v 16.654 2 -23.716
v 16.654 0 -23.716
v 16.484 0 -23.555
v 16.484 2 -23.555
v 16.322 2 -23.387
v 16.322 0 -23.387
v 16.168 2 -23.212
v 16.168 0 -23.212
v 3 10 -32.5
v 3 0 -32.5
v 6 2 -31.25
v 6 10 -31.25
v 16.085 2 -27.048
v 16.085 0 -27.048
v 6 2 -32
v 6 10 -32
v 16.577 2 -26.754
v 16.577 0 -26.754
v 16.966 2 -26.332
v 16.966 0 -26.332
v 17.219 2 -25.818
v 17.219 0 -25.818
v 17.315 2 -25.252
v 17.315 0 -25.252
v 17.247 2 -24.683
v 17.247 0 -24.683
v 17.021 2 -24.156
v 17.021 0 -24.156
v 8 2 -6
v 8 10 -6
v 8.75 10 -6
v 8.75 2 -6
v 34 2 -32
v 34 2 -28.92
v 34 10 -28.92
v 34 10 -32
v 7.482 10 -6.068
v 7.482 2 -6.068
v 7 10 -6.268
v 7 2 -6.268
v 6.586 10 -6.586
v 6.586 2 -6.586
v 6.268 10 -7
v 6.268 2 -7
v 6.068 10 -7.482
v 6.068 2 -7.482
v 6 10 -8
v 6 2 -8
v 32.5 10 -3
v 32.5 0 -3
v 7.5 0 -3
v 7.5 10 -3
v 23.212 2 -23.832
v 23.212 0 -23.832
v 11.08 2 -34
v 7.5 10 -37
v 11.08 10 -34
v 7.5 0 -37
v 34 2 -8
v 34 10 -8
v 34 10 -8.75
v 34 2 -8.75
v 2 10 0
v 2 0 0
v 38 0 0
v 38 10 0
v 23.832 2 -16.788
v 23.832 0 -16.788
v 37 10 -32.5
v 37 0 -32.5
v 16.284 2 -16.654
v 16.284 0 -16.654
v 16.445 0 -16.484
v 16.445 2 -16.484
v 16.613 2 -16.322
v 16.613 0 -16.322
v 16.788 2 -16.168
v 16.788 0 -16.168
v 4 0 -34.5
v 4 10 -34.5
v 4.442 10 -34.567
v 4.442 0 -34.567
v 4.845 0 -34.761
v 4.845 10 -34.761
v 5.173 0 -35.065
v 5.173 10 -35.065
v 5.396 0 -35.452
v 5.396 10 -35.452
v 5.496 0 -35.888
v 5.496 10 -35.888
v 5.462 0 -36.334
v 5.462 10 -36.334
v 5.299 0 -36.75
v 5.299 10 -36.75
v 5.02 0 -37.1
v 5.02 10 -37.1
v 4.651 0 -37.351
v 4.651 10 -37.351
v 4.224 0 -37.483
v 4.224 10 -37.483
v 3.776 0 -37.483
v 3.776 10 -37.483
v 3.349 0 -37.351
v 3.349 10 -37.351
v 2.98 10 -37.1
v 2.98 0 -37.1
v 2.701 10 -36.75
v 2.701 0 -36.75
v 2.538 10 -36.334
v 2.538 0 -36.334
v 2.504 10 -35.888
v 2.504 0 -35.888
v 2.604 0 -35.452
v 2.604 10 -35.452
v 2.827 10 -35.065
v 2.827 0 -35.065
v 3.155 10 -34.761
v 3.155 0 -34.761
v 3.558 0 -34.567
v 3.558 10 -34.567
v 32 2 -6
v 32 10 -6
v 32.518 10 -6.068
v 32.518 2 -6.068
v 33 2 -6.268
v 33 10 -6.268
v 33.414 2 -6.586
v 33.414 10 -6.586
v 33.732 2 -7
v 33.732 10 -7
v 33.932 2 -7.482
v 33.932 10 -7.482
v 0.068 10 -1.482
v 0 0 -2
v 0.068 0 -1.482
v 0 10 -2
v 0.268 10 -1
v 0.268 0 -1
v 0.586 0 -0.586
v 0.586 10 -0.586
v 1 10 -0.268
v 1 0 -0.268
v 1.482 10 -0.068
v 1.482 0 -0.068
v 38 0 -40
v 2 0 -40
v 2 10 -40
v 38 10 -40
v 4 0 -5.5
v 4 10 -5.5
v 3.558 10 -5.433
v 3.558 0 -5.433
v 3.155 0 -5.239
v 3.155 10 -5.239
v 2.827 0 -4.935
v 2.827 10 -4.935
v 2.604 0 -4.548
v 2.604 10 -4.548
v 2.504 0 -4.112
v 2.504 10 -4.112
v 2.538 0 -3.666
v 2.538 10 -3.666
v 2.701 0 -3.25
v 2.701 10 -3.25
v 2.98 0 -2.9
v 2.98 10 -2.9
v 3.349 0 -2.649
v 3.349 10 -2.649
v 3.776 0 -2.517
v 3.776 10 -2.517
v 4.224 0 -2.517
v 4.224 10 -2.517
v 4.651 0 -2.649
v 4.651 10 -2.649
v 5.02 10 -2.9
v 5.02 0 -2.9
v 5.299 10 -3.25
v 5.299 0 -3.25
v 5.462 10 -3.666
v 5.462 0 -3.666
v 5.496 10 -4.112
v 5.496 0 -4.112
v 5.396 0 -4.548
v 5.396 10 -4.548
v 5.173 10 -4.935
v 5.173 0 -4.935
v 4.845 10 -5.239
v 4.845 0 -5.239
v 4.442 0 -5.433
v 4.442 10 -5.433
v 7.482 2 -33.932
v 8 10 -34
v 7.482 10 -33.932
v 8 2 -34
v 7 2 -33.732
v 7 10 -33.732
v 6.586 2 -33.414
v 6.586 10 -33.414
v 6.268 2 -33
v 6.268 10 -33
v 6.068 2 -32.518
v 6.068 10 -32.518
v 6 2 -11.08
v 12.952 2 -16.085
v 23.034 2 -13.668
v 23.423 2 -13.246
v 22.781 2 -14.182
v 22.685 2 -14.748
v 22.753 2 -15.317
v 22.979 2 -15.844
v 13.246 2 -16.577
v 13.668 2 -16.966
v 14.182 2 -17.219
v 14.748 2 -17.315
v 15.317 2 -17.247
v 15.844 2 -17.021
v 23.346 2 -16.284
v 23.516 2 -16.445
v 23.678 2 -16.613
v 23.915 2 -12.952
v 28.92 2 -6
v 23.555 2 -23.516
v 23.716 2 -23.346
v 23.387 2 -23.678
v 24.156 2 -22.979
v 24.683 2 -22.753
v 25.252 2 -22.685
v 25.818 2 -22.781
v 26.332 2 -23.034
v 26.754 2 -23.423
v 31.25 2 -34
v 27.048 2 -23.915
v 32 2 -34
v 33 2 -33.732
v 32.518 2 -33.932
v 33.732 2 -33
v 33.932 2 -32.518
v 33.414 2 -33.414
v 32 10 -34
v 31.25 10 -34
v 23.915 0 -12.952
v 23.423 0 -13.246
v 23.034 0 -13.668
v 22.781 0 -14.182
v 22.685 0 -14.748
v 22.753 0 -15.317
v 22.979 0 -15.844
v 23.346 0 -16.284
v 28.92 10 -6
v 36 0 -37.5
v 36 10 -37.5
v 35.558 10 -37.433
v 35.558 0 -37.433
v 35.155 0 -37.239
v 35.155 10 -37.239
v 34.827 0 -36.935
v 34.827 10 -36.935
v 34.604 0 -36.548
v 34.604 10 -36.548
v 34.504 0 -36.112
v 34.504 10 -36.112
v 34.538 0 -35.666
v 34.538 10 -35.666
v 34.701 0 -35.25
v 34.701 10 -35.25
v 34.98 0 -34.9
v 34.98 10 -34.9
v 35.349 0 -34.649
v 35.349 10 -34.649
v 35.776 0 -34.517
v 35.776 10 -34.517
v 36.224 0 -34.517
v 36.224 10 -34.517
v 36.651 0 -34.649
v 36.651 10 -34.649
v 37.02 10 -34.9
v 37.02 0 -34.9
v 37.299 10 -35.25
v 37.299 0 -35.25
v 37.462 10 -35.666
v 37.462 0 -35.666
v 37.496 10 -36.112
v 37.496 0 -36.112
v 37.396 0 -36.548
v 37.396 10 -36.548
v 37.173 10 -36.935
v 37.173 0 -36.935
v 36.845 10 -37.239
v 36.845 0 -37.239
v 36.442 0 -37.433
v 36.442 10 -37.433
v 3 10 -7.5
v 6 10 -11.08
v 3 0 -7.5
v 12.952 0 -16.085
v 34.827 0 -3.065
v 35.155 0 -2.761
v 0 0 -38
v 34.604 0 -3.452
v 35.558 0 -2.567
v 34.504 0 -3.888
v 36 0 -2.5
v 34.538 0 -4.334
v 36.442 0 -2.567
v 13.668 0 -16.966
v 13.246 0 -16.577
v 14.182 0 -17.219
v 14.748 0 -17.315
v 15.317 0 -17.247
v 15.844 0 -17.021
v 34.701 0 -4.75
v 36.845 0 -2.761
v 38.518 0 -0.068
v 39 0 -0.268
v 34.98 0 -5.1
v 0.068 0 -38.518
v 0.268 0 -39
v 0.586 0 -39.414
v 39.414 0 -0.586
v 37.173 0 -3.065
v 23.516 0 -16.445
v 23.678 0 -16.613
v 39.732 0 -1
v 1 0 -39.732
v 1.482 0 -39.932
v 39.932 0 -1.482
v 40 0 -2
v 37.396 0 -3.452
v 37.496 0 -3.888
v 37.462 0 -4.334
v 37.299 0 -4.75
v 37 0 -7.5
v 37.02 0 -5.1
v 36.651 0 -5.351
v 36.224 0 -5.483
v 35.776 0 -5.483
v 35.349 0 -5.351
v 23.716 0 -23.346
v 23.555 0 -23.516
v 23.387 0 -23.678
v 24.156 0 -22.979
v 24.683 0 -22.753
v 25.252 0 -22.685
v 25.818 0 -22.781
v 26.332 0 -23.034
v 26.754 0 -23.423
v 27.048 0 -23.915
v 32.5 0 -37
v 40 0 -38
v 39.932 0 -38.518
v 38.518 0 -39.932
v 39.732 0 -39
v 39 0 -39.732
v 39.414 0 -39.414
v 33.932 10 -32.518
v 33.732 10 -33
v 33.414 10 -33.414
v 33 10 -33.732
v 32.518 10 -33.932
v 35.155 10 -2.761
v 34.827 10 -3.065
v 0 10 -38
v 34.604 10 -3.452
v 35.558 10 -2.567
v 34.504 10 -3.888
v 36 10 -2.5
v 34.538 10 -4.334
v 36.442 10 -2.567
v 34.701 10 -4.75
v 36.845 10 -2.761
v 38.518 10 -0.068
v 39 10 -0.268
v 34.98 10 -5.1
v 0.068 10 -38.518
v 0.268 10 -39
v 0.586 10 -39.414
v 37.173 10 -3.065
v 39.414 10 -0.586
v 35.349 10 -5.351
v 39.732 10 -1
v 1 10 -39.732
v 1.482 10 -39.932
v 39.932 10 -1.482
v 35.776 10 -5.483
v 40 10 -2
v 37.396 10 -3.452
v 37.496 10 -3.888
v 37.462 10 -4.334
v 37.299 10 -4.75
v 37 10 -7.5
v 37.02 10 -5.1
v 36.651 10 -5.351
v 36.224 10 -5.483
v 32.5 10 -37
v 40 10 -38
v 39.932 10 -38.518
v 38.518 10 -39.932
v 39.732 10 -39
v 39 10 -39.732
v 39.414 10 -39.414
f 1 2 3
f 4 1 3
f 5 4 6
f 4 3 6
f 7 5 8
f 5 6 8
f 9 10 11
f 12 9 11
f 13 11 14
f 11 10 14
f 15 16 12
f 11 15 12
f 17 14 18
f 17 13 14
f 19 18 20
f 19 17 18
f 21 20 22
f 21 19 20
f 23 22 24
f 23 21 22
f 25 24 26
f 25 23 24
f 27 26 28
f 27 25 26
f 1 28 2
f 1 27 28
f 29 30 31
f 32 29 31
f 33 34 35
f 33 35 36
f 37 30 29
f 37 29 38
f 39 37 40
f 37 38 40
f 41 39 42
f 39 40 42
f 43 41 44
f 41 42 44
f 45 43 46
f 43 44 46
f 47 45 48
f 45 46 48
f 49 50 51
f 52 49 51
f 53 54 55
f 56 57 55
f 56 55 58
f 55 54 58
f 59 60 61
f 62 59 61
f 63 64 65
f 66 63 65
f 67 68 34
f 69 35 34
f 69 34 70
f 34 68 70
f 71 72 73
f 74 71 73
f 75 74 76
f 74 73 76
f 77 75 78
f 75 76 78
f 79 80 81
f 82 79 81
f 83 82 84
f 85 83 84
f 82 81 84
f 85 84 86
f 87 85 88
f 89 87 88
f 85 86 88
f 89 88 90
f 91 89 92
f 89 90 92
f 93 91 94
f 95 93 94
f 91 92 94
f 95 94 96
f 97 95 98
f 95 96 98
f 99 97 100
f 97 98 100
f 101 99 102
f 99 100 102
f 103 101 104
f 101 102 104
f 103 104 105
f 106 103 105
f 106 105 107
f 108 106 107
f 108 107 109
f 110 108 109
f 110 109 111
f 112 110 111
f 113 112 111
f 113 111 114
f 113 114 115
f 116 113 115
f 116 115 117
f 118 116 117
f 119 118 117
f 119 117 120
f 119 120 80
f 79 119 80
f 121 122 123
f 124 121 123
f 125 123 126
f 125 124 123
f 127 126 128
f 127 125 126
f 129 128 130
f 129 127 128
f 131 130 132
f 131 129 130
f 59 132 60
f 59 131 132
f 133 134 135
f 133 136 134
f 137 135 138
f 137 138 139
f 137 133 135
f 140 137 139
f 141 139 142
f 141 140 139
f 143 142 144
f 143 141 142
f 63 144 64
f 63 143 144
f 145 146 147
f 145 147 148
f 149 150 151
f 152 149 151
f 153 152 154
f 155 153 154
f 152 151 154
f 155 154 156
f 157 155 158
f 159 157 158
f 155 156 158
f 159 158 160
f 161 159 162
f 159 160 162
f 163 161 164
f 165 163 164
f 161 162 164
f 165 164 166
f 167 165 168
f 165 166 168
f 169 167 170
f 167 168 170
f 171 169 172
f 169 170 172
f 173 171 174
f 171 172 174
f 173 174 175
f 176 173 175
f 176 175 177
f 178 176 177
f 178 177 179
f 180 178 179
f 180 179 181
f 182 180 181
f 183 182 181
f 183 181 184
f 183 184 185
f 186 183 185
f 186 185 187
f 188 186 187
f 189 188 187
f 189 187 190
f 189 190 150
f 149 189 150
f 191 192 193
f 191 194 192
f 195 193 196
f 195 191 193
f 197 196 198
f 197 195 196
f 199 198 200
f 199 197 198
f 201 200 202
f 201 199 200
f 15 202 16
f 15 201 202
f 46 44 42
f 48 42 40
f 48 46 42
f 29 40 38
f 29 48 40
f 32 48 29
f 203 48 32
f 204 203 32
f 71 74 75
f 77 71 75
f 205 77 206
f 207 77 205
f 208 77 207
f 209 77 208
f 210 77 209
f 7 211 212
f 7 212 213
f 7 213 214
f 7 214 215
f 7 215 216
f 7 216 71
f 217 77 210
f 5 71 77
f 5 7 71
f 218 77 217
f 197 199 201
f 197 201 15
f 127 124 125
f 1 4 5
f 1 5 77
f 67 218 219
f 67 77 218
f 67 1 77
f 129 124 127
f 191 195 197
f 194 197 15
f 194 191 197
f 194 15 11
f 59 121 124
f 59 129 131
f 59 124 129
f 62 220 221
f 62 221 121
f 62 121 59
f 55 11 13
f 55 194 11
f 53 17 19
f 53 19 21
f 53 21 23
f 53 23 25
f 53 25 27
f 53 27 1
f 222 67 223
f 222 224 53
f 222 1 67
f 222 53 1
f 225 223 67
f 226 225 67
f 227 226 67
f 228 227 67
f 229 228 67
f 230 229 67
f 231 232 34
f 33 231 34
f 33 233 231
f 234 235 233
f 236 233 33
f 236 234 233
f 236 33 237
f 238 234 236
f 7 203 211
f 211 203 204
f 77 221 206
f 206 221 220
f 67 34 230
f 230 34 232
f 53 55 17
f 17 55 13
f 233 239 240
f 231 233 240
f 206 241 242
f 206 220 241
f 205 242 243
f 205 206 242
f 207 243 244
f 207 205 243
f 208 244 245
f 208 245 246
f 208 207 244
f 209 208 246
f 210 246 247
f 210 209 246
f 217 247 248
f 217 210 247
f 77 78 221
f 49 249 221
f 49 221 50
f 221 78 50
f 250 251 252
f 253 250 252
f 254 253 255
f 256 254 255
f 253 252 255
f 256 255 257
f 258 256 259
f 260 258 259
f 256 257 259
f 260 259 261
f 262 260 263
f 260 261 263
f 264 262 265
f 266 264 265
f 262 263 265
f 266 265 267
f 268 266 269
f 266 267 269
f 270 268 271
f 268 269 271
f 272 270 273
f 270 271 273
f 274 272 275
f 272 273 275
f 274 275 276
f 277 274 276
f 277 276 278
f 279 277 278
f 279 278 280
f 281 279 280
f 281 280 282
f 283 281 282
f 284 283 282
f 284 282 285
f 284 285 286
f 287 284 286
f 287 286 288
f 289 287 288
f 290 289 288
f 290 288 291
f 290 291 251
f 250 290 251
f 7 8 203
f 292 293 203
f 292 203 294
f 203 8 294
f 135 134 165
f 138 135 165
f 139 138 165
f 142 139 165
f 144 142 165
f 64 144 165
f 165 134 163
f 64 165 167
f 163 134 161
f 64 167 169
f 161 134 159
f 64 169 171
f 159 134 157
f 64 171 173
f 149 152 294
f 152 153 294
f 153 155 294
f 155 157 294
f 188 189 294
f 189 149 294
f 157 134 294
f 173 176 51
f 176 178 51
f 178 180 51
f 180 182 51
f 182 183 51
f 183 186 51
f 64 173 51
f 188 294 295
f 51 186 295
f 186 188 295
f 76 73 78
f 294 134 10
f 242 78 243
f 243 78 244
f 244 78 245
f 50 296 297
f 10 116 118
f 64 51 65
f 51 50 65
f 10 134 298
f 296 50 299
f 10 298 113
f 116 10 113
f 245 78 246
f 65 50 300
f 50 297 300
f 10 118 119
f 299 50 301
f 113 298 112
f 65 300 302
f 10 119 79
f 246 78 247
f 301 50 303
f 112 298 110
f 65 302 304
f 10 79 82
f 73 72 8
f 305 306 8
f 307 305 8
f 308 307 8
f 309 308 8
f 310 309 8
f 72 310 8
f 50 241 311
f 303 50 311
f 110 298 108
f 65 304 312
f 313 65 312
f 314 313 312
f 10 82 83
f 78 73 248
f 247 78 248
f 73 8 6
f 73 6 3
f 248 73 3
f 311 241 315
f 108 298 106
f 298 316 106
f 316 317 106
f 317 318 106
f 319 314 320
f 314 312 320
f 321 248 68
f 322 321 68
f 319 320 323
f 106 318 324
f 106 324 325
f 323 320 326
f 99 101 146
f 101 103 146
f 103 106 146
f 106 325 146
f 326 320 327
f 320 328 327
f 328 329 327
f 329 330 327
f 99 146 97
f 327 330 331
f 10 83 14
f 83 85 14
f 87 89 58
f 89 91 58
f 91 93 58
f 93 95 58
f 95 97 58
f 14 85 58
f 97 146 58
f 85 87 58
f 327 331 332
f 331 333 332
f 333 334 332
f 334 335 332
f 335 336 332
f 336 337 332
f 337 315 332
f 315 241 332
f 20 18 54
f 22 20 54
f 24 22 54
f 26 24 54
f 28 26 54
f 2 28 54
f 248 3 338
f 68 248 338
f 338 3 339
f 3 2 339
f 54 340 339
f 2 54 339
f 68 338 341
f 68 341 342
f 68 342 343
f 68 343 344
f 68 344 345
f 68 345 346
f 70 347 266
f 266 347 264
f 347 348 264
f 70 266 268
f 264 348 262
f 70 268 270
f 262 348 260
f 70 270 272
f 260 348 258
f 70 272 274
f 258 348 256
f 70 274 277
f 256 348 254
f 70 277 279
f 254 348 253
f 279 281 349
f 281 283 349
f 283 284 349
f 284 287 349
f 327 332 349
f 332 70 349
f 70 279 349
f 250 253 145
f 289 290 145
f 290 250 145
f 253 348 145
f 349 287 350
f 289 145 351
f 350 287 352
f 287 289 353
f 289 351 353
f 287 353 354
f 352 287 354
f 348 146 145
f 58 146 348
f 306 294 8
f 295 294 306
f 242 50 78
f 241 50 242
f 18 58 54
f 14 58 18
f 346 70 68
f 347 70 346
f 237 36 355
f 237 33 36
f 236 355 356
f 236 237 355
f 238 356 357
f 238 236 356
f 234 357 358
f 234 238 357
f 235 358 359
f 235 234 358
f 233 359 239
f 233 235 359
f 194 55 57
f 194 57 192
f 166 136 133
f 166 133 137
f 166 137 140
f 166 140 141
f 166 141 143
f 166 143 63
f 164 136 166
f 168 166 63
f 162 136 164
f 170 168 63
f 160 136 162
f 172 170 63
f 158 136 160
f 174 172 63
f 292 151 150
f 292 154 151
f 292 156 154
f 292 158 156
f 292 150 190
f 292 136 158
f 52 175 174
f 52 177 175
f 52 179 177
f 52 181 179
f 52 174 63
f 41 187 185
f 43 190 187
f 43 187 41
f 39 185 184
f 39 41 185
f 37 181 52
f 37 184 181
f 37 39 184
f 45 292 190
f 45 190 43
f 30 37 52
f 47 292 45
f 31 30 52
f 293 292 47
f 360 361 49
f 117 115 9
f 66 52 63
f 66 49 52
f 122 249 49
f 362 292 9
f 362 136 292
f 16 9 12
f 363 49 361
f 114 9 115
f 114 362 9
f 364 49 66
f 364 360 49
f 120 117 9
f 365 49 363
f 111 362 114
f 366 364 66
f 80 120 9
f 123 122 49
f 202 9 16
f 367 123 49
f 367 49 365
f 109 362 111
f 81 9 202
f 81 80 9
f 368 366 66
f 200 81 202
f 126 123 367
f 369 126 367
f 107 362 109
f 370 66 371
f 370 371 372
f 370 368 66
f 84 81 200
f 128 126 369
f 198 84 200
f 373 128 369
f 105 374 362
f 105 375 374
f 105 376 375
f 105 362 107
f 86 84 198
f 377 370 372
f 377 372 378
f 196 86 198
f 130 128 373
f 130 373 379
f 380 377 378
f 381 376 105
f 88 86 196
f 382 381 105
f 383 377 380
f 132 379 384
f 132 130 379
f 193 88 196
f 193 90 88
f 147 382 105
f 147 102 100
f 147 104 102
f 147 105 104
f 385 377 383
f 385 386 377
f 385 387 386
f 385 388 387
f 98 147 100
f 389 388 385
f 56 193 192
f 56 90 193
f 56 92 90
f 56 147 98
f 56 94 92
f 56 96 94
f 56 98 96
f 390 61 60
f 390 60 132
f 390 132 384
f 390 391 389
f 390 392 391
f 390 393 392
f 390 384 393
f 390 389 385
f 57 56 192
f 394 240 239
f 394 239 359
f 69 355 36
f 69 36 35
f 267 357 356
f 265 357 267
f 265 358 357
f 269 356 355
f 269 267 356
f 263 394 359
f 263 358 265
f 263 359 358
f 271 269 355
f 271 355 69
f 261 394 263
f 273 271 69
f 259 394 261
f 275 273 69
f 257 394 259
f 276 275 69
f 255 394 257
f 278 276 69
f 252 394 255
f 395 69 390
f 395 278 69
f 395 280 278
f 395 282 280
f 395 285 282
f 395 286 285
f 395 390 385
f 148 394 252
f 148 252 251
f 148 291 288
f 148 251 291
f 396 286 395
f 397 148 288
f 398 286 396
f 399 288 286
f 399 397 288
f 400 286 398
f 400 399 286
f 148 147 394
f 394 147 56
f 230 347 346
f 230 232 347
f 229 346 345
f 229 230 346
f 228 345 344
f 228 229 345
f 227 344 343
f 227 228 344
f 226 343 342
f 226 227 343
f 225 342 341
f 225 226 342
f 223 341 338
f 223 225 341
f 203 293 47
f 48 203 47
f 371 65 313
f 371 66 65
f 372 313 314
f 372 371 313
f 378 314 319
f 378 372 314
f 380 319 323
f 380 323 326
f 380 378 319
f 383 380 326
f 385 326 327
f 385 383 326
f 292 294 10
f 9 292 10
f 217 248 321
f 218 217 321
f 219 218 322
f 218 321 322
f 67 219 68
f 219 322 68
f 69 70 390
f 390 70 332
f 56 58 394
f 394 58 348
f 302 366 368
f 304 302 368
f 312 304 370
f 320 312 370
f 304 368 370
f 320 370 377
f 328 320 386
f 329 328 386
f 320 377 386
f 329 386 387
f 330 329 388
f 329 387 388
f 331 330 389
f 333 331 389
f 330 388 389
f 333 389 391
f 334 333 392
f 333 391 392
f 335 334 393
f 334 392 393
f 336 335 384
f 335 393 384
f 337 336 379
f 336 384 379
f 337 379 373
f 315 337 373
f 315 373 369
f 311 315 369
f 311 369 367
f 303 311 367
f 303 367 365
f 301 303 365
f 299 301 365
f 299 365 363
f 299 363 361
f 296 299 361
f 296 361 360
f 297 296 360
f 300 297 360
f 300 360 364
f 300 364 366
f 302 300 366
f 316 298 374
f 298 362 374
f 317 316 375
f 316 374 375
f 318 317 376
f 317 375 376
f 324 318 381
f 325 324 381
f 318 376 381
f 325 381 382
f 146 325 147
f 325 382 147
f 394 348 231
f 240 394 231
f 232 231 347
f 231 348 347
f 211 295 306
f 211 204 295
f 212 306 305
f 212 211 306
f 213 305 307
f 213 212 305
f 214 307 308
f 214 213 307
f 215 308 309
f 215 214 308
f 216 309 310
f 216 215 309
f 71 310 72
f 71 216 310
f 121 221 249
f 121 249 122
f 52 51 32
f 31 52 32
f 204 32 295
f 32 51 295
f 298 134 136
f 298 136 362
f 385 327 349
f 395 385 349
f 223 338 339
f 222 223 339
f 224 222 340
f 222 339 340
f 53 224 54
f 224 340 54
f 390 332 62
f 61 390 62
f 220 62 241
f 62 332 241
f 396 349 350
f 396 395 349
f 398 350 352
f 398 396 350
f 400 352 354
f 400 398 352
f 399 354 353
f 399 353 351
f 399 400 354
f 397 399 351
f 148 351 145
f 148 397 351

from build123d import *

# Parameters (mm, degrees)
SKETCH_1_W          = 40
SKETCH_1_H          = 40
EXTRUDE_1_DEPTH     = 10
FILLET_1_R          = 2
CUT_EXTRUDE_1_DEPTH = 8
FILLET_2_R          = 2
SKETCH_3_R          = 1.5
SKETCH_3_R_2        = 1.4999999999999978
SKETCH_3_R_3        = 1.500000000000004
SKETCH_3_R_4        = 1.5000000000000042
CUT_EXTRUDE_2_DEPTH = 58.445626465380286
CUT_EXTRUDE_3_DEPTH = 58.445626465380286
FILLET_3_R          = 2


with BuildPart() as part:
    # 草图1 → 凸台-拉伸1 (new body)
    with BuildSketch(Plane(origin=(0, 0, 0), x_dir=(1, 0, 0), z_dir=(0, 1, 0))):
        with Locations((20, 20)):
            Rectangle(SKETCH_1_W, SKETCH_1_H)
    extrude(amount=EXTRUDE_1_DEPTH)

    # 圆角1
    fillet_1_edges = [part.edges().sort_by_distance(p)[0] for p in [
        (0, 5, -40),
        (40, 5, -40),
        (40, 5, 0),
        (0, 5, 0),
    ]]
    fillet(fillet_1_edges, radius=FILLET_1_R)

    # 草图2 → 切除-拉伸1 (cut)
    with BuildSketch(Plane(origin=(0, 10, 0), x_dir=(1, 0, 0), z_dir=(0, 1, 0))):
        Polygon((6, 5.999999999999999), (34, 6), (34, 34), (5.999999999999999, 34), align=None)
    extrude(amount=-CUT_EXTRUDE_1_DEPTH, mode=Mode.SUBTRACT)

    # 圆角2
    fillet_2_edges = [part.edges().sort_by_distance(p)[0] for p in [
        (6, 6, -5.999999999999999),
        (5.999999999999999, 6, -34),
        (34, 6, -34),
        (34, 6, -6),
    ]]
    fillet(fillet_2_edges, radius=FILLET_2_R)

    # 草图3 → 切除-拉伸2 (cut, through all)
    with BuildSketch(Plane(origin=(0, 10, 0), x_dir=(1, 0, 0), z_dir=(0, 1, 0))):
        with Locations(Location((4.0000000000000036, 36.00000000000001, 0), (0, 0, 270))):
            Circle(SKETCH_3_R)
        with Locations(Location((4.0000000000000036, 4, 0), (0, 0, 90))):
            Circle(SKETCH_3_R_2)
        with Locations(Location((36.00000000000001, 4.000000000000004, 0), (0, 0, 270))):
            Circle(SKETCH_3_R_3)
        with Locations(Location((36.00000000000001, 36.00000000000002, 0), (0, 0, 90))):
            Circle(SKETCH_3_R_4)
    extrude(amount=-CUT_EXTRUDE_2_DEPTH, mode=Mode.SUBTRACT)

    # 草图4 → 切除-拉伸3 (cut, through all)
    with BuildSketch(Plane.XZ):
        with BuildLine():
            ThreePointArc((21.923076923076923, -24.615384615384617), (18.815219099044967, -24.857601693915647), (16.167883211678838, -23.211678832116792))
            Line((16.167883211678838, -23.211678832116792), (2.9999999999999947, -7.5))
            Line((2.999999999999995, -7.5), (2.999999999999995, -32.5))
            Line((2.9999999999999964, -32.5), (21.923076923076927, -24.615384615384624))
        make_face()
        with BuildLine():
            Line((7.500000000000055, -2.9999999999999467), (15.38461538461537, -21.923076923076906))
            ThreePointArc((15.384615384615378, -21.923076923076902), (15.14239830608436, -18.815219099044945), (16.788321167883222, -16.167883211678824))
            Line((16.788321167883222, -16.167883211678824), (32.50000000000006, -3.0000000000000355))
            Line((32.50000000000006, -3.000000000000034), (7.500000000000057, -2.9999999999999467))
        make_face()
        with BuildLine():
            Line((37.0000000000001, -7.500000000000116), (18.076923076923116, -15.384615384615365))
            ThreePointArc((18.07692307692312, -15.384615384615369), (21.184780900955076, -15.14239830608436), (23.832116788321194, -16.788321167883236))
            Line((23.832116788321194, -16.788321167883232), (36.99999999999993, -32.50000000000012))
            Line((36.99999999999993, -32.50000000000012), (37.0000000000001, -7.500000000000117))
        make_face()
        with BuildLine():
            ThreePointArc((25.000000000000004, -20), (24.53091569997632, -22.114427326655647), (23.211678832116753, -23.8321167883212))
            Line((23.211678832116757, -23.832116788321205), (7.499999999999826, -36.99999999999988))
            Line((7.499999999999827, -36.99999999999988), (32.49999999999984, -37.00000000000014))
            Line((32.49999999999984, -37.00000000000014), (24.615384615384645, -18.07692307692313))
            ThreePointArc((24.61538461538464, -18.07692307692313), (24.90290337845461, -19.01941932430911), (25.000000000000004, -20))
        make_face()
    extrude(amount=-CUT_EXTRUDE_3_DEPTH, mode=Mode.SUBTRACT)

    # 圆角3
    fillet_3_edges = [part.edges().sort_by_distance(p)[0] for p in [
        (18.076923076923116, 1, -15.384615384615367),
        (15.384615384615376, 1, -21.923076923076906),
        (24.61538461538464, 1, -18.07692307692313),
    ]]
    fillet(fillet_3_edges, radius=FILLET_3_R)
    fillet_3_2_edges = [part.edges().sort_by_distance(p)[0] for p in [
        (21.923076923076927, 1, -24.61538461538462),
    ]]
    fillet(fillet_3_2_edges, radius=FILLET_3_R - 0.0001)  # a hair under: the kernel refuses the full size


solid = part.part
